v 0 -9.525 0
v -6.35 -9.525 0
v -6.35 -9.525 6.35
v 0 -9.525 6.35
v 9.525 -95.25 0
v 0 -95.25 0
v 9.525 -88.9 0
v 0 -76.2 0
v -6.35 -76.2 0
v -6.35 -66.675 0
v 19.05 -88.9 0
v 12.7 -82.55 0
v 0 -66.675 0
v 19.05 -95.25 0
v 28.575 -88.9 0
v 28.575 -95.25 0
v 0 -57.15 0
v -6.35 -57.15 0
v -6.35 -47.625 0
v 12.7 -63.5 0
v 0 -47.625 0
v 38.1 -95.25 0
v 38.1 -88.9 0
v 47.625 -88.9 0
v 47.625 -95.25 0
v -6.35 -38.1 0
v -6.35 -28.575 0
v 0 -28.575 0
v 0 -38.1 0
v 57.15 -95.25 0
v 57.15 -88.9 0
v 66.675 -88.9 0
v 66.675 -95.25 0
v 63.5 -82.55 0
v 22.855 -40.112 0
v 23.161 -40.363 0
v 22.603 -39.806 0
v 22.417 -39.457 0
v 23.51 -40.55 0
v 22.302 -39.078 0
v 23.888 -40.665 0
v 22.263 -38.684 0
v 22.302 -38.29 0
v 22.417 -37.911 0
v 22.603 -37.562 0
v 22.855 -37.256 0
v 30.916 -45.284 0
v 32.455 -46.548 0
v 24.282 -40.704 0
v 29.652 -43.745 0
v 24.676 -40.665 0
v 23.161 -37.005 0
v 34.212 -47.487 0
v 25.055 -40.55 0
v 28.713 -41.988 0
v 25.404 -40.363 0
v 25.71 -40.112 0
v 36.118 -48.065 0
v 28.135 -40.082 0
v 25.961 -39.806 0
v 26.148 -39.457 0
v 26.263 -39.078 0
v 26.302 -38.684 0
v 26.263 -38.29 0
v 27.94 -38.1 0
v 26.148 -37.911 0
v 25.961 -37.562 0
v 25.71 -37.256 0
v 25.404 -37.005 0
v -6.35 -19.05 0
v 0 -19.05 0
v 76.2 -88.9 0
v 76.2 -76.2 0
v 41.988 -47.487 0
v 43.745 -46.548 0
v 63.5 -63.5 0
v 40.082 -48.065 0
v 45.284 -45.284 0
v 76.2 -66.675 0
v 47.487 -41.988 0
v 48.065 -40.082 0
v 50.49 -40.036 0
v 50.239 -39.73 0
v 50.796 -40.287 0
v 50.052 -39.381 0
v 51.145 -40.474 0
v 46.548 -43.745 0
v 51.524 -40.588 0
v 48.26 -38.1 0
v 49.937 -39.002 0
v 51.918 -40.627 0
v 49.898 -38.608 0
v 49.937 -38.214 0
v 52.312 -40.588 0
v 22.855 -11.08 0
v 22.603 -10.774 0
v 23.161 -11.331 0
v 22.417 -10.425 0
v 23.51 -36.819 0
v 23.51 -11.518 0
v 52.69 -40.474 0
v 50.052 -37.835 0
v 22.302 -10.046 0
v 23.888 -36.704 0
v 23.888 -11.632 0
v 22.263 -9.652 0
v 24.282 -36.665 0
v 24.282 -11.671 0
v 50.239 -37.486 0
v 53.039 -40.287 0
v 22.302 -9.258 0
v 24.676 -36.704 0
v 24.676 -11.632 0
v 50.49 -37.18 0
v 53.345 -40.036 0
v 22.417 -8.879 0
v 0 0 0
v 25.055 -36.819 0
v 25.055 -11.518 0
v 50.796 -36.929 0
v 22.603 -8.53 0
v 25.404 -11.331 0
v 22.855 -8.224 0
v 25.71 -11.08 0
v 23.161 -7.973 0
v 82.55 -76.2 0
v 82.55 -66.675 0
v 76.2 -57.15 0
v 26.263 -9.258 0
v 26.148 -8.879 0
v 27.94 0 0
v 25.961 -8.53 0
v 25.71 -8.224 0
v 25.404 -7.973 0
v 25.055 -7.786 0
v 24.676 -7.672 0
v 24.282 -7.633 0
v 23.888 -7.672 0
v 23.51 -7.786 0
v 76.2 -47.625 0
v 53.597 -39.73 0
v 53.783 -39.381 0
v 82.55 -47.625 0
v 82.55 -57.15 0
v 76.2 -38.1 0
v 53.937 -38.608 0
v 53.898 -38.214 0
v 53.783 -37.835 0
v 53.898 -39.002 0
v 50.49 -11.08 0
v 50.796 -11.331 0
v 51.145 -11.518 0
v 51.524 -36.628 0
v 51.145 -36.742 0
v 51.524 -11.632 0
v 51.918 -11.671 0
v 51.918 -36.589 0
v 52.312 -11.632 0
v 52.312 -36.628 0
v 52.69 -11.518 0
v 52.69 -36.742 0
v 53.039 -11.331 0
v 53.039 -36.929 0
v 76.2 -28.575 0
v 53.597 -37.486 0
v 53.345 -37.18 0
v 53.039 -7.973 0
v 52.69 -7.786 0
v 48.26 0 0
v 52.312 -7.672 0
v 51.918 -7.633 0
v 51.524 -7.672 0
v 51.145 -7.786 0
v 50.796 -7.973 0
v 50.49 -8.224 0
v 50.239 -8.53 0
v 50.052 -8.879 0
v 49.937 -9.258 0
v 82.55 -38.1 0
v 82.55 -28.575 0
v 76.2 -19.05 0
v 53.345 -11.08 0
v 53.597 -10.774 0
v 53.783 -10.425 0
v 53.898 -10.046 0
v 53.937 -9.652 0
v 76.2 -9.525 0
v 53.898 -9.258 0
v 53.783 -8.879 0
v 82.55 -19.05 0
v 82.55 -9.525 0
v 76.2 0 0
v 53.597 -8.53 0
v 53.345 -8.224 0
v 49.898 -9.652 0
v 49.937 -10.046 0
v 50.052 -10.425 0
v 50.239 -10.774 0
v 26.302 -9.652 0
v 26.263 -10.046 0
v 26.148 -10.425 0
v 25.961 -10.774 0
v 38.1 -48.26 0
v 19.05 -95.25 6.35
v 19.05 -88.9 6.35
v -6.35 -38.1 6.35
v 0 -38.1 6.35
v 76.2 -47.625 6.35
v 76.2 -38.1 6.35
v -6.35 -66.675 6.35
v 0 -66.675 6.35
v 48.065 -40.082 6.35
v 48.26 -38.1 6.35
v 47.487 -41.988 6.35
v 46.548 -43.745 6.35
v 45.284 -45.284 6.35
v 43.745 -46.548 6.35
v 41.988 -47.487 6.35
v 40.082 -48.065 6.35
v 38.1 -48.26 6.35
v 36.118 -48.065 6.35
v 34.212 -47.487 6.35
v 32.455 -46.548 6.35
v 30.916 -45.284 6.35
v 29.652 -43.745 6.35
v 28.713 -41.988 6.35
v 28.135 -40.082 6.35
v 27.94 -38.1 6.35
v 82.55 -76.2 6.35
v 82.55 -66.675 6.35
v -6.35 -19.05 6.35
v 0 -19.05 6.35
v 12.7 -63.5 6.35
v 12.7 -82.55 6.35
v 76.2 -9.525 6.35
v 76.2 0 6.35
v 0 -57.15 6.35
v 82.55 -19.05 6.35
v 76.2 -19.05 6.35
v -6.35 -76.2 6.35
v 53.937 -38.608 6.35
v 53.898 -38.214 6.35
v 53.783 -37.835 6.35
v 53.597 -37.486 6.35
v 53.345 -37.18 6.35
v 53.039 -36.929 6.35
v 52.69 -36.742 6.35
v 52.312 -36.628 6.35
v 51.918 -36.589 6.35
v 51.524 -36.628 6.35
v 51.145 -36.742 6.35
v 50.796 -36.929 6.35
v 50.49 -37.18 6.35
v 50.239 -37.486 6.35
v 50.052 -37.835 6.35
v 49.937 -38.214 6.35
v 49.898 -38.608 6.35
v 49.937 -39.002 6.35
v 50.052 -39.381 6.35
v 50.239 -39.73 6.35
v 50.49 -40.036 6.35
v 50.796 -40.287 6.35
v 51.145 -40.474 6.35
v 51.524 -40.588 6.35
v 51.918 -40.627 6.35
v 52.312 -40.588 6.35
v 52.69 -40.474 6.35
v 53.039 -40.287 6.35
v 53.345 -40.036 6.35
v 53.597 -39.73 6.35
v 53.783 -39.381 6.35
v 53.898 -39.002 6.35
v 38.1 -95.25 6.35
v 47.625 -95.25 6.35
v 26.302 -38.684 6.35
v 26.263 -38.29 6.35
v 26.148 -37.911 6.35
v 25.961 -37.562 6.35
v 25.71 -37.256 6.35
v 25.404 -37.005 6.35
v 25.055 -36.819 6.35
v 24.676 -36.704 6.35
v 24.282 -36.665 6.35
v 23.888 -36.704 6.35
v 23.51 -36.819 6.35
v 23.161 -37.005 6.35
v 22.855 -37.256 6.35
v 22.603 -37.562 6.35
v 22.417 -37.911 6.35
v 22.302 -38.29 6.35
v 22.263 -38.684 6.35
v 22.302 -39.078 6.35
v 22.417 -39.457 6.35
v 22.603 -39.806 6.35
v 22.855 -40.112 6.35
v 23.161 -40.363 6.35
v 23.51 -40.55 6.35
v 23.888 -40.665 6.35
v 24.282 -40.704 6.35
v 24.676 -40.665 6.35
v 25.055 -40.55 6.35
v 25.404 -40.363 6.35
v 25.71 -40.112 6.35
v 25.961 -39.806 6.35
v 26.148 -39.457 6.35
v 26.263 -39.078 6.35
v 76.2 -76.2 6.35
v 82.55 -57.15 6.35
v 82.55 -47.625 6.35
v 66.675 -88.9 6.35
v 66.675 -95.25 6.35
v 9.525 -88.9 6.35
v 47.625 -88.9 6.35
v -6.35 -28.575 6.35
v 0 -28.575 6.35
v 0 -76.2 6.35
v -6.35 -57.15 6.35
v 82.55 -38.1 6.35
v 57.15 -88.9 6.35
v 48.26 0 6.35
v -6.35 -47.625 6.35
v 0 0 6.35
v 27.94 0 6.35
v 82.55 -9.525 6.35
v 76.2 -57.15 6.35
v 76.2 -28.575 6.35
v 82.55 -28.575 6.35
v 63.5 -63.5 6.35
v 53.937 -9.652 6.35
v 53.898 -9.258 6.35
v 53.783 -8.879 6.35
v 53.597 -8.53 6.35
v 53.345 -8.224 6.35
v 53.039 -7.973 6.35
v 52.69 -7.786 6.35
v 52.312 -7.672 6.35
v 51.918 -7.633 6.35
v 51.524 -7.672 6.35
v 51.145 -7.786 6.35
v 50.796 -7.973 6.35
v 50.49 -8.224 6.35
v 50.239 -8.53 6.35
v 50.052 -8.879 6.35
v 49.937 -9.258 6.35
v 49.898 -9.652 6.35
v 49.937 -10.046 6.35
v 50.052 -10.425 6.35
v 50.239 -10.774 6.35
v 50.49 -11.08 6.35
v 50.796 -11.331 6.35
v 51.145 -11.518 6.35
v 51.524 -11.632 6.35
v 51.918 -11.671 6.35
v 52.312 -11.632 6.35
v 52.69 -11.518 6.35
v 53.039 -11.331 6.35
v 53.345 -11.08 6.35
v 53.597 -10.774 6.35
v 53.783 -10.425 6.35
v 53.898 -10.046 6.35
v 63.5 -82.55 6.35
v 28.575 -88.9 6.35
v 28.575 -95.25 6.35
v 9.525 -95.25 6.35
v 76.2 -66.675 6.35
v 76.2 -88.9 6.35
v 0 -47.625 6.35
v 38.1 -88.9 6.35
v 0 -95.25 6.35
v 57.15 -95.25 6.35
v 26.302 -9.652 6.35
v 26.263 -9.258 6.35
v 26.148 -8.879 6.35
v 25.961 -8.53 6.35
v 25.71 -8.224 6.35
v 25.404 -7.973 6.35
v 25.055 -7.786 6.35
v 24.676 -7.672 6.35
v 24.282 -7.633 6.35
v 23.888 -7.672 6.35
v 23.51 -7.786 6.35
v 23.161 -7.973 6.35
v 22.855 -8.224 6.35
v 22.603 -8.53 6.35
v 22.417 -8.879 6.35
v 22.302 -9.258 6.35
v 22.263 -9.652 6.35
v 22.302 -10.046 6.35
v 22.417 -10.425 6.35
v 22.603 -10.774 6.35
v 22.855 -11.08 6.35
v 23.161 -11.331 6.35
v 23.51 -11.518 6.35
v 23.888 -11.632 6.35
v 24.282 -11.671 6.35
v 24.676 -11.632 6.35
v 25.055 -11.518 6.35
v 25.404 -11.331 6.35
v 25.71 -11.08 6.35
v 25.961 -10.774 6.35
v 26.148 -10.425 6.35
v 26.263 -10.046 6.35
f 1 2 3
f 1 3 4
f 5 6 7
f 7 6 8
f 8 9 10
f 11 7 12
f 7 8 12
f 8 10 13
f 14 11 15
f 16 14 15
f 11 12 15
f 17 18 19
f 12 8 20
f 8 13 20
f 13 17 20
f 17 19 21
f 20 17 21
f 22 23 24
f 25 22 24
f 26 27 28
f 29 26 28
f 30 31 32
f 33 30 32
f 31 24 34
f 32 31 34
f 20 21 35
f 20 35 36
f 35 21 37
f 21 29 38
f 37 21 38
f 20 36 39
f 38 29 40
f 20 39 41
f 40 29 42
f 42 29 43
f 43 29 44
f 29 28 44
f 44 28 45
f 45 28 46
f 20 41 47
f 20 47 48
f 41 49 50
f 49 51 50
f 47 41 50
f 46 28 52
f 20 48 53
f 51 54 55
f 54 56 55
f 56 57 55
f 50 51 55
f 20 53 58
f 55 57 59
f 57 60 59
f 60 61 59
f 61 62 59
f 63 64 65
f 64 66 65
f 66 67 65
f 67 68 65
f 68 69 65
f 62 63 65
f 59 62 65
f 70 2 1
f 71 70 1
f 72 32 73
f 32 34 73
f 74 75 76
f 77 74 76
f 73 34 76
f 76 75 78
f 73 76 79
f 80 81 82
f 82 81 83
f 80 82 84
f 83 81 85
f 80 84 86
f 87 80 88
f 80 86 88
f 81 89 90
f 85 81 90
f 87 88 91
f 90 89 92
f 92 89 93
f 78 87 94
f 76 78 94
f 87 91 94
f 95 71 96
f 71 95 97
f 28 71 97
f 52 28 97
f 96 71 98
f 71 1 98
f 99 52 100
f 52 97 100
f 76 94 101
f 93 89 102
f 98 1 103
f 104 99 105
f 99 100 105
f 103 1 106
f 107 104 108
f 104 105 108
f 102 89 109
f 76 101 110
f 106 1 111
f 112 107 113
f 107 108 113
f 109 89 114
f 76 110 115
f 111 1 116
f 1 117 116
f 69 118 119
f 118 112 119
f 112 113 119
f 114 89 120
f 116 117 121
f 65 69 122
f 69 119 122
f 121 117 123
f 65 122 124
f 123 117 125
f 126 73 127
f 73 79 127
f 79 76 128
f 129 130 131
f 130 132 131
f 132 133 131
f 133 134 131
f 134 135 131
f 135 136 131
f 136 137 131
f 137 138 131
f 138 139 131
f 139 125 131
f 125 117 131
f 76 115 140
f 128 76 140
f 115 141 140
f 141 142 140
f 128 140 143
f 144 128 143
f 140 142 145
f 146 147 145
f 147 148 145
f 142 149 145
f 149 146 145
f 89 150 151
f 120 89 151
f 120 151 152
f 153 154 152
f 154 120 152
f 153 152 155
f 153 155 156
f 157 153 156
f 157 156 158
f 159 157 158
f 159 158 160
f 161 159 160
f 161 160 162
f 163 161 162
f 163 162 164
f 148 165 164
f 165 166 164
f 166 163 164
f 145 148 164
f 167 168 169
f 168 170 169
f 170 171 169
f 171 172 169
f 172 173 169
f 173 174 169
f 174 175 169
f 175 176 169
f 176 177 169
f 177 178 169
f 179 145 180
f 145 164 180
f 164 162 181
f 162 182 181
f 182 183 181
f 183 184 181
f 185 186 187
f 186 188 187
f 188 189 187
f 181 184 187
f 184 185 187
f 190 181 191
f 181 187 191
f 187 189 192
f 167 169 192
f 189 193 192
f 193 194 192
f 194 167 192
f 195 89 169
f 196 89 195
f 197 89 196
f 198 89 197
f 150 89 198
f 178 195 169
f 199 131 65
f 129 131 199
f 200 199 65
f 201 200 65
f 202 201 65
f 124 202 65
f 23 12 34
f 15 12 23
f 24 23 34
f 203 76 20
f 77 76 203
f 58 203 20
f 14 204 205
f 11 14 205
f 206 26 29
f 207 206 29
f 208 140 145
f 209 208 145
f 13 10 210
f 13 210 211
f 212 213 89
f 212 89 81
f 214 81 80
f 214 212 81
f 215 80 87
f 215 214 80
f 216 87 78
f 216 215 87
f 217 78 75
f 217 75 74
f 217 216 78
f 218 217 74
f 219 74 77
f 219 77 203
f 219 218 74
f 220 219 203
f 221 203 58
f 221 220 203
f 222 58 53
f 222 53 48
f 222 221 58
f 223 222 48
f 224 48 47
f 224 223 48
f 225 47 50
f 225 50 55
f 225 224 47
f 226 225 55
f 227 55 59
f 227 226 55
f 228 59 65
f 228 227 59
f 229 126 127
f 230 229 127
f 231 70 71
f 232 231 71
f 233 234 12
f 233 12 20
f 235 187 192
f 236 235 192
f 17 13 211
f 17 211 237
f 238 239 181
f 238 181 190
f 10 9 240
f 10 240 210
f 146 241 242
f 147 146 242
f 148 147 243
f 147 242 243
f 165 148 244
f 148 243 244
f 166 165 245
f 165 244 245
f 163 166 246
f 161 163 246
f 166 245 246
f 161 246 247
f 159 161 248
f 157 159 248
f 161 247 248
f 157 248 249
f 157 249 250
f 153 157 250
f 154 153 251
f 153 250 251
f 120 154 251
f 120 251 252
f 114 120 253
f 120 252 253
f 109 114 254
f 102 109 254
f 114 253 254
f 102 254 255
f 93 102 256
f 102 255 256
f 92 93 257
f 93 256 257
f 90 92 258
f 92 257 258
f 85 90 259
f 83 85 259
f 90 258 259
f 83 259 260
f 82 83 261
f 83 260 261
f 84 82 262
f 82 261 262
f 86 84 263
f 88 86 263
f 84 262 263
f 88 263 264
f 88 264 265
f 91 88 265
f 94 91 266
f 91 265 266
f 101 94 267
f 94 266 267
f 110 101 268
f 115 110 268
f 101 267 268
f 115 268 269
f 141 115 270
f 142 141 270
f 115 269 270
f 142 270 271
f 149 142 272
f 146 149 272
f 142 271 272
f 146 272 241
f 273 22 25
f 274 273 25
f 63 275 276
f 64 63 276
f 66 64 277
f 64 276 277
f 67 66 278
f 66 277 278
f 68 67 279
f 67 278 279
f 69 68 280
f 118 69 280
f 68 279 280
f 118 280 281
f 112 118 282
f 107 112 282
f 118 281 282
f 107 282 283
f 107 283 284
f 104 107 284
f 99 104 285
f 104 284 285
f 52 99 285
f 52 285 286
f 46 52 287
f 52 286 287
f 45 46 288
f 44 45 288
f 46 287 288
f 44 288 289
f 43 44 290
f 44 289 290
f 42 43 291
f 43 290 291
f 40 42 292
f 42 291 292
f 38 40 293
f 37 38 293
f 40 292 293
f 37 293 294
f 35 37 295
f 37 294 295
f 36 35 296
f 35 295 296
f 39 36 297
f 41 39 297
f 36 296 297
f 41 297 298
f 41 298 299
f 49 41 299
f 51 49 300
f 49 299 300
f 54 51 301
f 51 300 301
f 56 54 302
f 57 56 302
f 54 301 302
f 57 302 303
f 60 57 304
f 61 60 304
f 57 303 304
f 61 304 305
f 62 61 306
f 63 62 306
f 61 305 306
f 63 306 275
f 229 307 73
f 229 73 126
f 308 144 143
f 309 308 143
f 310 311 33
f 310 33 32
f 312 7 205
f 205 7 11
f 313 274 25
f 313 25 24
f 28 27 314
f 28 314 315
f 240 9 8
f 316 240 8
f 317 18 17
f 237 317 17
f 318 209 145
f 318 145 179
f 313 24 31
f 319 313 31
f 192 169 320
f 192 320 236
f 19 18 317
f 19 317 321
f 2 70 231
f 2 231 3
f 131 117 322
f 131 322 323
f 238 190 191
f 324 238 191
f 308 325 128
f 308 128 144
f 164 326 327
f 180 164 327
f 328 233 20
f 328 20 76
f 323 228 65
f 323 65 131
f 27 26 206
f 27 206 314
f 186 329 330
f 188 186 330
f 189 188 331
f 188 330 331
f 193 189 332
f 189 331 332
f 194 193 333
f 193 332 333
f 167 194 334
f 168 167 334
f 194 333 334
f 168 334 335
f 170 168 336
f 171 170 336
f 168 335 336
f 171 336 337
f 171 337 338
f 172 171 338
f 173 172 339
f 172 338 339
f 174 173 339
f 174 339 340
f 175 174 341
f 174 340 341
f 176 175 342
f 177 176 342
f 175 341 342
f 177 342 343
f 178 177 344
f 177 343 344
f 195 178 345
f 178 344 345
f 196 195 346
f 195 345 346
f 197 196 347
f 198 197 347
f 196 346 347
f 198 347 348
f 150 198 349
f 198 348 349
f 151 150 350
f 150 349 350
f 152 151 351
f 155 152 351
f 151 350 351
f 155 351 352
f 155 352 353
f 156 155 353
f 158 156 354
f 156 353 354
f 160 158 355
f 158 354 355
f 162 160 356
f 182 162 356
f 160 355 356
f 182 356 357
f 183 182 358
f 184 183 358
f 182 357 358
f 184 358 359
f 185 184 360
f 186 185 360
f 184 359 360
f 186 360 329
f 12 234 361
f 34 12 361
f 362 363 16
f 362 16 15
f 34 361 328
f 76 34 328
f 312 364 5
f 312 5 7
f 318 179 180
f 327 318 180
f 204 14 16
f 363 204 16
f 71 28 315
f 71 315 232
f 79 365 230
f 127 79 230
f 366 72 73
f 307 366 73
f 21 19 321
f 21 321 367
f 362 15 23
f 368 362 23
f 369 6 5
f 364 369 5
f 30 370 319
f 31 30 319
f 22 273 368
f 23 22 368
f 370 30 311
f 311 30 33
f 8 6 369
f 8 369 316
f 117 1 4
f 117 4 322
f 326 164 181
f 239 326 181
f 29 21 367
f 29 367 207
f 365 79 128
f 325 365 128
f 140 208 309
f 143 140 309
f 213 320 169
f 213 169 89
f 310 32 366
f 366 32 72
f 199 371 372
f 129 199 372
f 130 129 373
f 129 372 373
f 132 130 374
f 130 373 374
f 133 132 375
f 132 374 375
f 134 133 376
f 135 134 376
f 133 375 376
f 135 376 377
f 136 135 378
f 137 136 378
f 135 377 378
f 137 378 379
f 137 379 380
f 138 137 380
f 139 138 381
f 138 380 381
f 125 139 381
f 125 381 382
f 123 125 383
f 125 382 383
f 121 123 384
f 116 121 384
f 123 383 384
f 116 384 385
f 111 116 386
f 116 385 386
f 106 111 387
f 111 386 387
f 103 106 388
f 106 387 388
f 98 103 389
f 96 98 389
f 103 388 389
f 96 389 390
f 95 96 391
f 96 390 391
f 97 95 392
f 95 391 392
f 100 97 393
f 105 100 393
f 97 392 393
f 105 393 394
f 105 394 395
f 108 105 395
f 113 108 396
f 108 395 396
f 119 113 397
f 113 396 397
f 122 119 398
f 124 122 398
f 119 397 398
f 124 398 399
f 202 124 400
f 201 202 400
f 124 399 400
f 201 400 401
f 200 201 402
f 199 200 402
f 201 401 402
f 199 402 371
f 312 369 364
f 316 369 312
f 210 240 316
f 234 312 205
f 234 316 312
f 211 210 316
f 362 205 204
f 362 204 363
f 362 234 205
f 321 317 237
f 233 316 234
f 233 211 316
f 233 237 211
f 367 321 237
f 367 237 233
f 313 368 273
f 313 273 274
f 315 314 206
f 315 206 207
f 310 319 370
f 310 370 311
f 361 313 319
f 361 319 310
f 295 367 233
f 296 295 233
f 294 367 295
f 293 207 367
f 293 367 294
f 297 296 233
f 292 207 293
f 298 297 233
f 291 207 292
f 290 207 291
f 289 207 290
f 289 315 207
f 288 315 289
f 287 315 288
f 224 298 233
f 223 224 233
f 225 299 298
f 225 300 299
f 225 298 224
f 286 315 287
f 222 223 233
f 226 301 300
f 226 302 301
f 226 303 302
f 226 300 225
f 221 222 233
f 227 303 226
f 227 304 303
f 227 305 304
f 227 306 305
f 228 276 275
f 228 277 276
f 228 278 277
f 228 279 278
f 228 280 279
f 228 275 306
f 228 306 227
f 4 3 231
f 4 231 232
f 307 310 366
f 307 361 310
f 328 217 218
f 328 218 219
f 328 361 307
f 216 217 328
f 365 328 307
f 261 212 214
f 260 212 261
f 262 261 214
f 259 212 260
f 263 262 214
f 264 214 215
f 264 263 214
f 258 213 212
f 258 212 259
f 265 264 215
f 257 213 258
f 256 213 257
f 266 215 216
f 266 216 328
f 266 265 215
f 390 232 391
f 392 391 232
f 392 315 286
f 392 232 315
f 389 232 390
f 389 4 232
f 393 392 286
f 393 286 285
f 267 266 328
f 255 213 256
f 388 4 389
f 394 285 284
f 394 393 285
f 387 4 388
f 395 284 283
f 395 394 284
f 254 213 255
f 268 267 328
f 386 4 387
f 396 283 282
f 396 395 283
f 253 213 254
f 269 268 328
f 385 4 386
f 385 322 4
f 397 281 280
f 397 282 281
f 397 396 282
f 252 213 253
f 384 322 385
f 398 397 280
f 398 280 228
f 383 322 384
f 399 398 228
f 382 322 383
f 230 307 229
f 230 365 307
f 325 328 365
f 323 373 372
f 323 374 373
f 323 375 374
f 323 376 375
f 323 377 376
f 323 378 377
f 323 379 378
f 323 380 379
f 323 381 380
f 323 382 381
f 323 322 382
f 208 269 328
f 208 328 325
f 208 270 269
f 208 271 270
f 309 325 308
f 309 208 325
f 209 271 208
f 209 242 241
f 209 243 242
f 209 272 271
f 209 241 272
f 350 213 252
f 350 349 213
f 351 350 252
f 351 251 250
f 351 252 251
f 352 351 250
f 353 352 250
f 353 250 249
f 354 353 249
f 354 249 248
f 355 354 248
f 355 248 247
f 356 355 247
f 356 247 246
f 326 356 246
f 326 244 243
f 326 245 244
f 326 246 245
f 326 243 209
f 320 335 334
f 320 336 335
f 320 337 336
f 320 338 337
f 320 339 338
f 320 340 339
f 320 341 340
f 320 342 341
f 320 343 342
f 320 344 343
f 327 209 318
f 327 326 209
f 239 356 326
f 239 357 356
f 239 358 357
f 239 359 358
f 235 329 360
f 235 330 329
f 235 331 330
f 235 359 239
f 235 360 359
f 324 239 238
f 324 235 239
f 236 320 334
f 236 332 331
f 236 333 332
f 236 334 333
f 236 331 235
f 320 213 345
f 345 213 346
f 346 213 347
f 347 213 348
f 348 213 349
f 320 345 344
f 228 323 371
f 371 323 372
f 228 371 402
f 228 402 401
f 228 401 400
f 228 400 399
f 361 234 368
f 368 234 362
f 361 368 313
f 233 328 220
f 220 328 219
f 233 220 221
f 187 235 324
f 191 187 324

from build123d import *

# Parameters (mm, degrees)
SKETCH1_W           = 76.2
SKETCH1_H           = 88.9
BOSS_EXTRUDE1_DEPTH = 6.35
SKETCH2_R           = 2.0193
SKETCH2_W           = 50.8
SKETCH2_H           = 19.05
CUT_EXTRUDE1_DEPTH  = 6.35
SKETCH3_W           = 6.35
SKETCH3_H           = 9.525
SKETCH3_W_2         = 9.525
SKETCH3_H_2         = 6.35
BOSS_EXTRUDE3_DEPTH = 6.35


with BuildPart() as part:
    # Sketch1 → Boss-Extrude1 (new body)
    with BuildSketch(Plane.XY):
        with Locations((38.1, -44.45)):
            Rectangle(SKETCH1_W, SKETCH1_H)
    extrude(amount=BOSS_EXTRUDE1_DEPTH)

    # Sketch2 → Cut-Extrude1 (cut)
    with BuildSketch(Plane.XY.offset(6.35)):
        with Locations((51.9176, -9.652)):
            Circle(SKETCH2_R)
        with Locations((51.9176, -38.608)):
            Circle(SKETCH2_R)
        with Locations((24.2824, -38.6842)):
            Circle(SKETCH2_R)
        with Locations((24.2824, -9.652)):
            Circle(SKETCH2_R)
        with BuildLine():
            Line((48.26, 0), (48.26, -38.1))
            ThreePointArc((48.26, -38.1), (38.1, -48.26), (27.94, -38.1))
            Line((27.94, -38.1), (27.94, 0))
            ThreePointArc((27.94, 0), (38.1, 10.16), (48.26, 0))
        make_face()
        with Locations((38.1, -73.025)):
            Rectangle(SKETCH2_W, SKETCH2_H)
    extrude(amount=-CUT_EXTRUDE1_DEPTH, mode=Mode.SUBTRACT)

    # Sketch3 → Boss-Extrude3 (add)
    with BuildSketch(Plane.XY):
        with Locations((-3.175, -14.2875)):
            Rectangle(SKETCH3_W, SKETCH3_H)
        with Locations((-3.175, -33.3375)):
            Rectangle(SKETCH3_W, SKETCH3_H)
        with Locations((-3.175, -52.3875)):
            Rectangle(SKETCH3_W, SKETCH3_H)
        with Locations((-3.175, -71.4375)):
            Rectangle(SKETCH3_W, SKETCH3_H)
        with Locations((4.7625, -92.075)):
            Rectangle(SKETCH3_W_2, SKETCH3_H_2)
        with Locations((23.8125, -92.075)):
            Rectangle(SKETCH3_W_2, SKETCH3_H_2)
        with Locations((42.8625, -92.075)):
            Rectangle(SKETCH3_W_2, SKETCH3_H_2)
        with Locations((61.9125, -92.075)):
            Rectangle(SKETCH3_W_2, SKETCH3_H_2)
        with Locations((79.375, -71.4375)):
            Rectangle(SKETCH3_W, SKETCH3_H)
        with Locations((79.375, -52.3875)):
            Rectangle(SKETCH3_W, SKETCH3_H)
        with Locations((79.375, -33.3375)):
            Rectangle(SKETCH3_W, SKETCH3_H)
        with Locations((79.375, -14.2875)):
            Rectangle(SKETCH3_W, SKETCH3_H)
    extrude(amount=BOSS_EXTRUDE3_DEPTH)


solid = part.part
